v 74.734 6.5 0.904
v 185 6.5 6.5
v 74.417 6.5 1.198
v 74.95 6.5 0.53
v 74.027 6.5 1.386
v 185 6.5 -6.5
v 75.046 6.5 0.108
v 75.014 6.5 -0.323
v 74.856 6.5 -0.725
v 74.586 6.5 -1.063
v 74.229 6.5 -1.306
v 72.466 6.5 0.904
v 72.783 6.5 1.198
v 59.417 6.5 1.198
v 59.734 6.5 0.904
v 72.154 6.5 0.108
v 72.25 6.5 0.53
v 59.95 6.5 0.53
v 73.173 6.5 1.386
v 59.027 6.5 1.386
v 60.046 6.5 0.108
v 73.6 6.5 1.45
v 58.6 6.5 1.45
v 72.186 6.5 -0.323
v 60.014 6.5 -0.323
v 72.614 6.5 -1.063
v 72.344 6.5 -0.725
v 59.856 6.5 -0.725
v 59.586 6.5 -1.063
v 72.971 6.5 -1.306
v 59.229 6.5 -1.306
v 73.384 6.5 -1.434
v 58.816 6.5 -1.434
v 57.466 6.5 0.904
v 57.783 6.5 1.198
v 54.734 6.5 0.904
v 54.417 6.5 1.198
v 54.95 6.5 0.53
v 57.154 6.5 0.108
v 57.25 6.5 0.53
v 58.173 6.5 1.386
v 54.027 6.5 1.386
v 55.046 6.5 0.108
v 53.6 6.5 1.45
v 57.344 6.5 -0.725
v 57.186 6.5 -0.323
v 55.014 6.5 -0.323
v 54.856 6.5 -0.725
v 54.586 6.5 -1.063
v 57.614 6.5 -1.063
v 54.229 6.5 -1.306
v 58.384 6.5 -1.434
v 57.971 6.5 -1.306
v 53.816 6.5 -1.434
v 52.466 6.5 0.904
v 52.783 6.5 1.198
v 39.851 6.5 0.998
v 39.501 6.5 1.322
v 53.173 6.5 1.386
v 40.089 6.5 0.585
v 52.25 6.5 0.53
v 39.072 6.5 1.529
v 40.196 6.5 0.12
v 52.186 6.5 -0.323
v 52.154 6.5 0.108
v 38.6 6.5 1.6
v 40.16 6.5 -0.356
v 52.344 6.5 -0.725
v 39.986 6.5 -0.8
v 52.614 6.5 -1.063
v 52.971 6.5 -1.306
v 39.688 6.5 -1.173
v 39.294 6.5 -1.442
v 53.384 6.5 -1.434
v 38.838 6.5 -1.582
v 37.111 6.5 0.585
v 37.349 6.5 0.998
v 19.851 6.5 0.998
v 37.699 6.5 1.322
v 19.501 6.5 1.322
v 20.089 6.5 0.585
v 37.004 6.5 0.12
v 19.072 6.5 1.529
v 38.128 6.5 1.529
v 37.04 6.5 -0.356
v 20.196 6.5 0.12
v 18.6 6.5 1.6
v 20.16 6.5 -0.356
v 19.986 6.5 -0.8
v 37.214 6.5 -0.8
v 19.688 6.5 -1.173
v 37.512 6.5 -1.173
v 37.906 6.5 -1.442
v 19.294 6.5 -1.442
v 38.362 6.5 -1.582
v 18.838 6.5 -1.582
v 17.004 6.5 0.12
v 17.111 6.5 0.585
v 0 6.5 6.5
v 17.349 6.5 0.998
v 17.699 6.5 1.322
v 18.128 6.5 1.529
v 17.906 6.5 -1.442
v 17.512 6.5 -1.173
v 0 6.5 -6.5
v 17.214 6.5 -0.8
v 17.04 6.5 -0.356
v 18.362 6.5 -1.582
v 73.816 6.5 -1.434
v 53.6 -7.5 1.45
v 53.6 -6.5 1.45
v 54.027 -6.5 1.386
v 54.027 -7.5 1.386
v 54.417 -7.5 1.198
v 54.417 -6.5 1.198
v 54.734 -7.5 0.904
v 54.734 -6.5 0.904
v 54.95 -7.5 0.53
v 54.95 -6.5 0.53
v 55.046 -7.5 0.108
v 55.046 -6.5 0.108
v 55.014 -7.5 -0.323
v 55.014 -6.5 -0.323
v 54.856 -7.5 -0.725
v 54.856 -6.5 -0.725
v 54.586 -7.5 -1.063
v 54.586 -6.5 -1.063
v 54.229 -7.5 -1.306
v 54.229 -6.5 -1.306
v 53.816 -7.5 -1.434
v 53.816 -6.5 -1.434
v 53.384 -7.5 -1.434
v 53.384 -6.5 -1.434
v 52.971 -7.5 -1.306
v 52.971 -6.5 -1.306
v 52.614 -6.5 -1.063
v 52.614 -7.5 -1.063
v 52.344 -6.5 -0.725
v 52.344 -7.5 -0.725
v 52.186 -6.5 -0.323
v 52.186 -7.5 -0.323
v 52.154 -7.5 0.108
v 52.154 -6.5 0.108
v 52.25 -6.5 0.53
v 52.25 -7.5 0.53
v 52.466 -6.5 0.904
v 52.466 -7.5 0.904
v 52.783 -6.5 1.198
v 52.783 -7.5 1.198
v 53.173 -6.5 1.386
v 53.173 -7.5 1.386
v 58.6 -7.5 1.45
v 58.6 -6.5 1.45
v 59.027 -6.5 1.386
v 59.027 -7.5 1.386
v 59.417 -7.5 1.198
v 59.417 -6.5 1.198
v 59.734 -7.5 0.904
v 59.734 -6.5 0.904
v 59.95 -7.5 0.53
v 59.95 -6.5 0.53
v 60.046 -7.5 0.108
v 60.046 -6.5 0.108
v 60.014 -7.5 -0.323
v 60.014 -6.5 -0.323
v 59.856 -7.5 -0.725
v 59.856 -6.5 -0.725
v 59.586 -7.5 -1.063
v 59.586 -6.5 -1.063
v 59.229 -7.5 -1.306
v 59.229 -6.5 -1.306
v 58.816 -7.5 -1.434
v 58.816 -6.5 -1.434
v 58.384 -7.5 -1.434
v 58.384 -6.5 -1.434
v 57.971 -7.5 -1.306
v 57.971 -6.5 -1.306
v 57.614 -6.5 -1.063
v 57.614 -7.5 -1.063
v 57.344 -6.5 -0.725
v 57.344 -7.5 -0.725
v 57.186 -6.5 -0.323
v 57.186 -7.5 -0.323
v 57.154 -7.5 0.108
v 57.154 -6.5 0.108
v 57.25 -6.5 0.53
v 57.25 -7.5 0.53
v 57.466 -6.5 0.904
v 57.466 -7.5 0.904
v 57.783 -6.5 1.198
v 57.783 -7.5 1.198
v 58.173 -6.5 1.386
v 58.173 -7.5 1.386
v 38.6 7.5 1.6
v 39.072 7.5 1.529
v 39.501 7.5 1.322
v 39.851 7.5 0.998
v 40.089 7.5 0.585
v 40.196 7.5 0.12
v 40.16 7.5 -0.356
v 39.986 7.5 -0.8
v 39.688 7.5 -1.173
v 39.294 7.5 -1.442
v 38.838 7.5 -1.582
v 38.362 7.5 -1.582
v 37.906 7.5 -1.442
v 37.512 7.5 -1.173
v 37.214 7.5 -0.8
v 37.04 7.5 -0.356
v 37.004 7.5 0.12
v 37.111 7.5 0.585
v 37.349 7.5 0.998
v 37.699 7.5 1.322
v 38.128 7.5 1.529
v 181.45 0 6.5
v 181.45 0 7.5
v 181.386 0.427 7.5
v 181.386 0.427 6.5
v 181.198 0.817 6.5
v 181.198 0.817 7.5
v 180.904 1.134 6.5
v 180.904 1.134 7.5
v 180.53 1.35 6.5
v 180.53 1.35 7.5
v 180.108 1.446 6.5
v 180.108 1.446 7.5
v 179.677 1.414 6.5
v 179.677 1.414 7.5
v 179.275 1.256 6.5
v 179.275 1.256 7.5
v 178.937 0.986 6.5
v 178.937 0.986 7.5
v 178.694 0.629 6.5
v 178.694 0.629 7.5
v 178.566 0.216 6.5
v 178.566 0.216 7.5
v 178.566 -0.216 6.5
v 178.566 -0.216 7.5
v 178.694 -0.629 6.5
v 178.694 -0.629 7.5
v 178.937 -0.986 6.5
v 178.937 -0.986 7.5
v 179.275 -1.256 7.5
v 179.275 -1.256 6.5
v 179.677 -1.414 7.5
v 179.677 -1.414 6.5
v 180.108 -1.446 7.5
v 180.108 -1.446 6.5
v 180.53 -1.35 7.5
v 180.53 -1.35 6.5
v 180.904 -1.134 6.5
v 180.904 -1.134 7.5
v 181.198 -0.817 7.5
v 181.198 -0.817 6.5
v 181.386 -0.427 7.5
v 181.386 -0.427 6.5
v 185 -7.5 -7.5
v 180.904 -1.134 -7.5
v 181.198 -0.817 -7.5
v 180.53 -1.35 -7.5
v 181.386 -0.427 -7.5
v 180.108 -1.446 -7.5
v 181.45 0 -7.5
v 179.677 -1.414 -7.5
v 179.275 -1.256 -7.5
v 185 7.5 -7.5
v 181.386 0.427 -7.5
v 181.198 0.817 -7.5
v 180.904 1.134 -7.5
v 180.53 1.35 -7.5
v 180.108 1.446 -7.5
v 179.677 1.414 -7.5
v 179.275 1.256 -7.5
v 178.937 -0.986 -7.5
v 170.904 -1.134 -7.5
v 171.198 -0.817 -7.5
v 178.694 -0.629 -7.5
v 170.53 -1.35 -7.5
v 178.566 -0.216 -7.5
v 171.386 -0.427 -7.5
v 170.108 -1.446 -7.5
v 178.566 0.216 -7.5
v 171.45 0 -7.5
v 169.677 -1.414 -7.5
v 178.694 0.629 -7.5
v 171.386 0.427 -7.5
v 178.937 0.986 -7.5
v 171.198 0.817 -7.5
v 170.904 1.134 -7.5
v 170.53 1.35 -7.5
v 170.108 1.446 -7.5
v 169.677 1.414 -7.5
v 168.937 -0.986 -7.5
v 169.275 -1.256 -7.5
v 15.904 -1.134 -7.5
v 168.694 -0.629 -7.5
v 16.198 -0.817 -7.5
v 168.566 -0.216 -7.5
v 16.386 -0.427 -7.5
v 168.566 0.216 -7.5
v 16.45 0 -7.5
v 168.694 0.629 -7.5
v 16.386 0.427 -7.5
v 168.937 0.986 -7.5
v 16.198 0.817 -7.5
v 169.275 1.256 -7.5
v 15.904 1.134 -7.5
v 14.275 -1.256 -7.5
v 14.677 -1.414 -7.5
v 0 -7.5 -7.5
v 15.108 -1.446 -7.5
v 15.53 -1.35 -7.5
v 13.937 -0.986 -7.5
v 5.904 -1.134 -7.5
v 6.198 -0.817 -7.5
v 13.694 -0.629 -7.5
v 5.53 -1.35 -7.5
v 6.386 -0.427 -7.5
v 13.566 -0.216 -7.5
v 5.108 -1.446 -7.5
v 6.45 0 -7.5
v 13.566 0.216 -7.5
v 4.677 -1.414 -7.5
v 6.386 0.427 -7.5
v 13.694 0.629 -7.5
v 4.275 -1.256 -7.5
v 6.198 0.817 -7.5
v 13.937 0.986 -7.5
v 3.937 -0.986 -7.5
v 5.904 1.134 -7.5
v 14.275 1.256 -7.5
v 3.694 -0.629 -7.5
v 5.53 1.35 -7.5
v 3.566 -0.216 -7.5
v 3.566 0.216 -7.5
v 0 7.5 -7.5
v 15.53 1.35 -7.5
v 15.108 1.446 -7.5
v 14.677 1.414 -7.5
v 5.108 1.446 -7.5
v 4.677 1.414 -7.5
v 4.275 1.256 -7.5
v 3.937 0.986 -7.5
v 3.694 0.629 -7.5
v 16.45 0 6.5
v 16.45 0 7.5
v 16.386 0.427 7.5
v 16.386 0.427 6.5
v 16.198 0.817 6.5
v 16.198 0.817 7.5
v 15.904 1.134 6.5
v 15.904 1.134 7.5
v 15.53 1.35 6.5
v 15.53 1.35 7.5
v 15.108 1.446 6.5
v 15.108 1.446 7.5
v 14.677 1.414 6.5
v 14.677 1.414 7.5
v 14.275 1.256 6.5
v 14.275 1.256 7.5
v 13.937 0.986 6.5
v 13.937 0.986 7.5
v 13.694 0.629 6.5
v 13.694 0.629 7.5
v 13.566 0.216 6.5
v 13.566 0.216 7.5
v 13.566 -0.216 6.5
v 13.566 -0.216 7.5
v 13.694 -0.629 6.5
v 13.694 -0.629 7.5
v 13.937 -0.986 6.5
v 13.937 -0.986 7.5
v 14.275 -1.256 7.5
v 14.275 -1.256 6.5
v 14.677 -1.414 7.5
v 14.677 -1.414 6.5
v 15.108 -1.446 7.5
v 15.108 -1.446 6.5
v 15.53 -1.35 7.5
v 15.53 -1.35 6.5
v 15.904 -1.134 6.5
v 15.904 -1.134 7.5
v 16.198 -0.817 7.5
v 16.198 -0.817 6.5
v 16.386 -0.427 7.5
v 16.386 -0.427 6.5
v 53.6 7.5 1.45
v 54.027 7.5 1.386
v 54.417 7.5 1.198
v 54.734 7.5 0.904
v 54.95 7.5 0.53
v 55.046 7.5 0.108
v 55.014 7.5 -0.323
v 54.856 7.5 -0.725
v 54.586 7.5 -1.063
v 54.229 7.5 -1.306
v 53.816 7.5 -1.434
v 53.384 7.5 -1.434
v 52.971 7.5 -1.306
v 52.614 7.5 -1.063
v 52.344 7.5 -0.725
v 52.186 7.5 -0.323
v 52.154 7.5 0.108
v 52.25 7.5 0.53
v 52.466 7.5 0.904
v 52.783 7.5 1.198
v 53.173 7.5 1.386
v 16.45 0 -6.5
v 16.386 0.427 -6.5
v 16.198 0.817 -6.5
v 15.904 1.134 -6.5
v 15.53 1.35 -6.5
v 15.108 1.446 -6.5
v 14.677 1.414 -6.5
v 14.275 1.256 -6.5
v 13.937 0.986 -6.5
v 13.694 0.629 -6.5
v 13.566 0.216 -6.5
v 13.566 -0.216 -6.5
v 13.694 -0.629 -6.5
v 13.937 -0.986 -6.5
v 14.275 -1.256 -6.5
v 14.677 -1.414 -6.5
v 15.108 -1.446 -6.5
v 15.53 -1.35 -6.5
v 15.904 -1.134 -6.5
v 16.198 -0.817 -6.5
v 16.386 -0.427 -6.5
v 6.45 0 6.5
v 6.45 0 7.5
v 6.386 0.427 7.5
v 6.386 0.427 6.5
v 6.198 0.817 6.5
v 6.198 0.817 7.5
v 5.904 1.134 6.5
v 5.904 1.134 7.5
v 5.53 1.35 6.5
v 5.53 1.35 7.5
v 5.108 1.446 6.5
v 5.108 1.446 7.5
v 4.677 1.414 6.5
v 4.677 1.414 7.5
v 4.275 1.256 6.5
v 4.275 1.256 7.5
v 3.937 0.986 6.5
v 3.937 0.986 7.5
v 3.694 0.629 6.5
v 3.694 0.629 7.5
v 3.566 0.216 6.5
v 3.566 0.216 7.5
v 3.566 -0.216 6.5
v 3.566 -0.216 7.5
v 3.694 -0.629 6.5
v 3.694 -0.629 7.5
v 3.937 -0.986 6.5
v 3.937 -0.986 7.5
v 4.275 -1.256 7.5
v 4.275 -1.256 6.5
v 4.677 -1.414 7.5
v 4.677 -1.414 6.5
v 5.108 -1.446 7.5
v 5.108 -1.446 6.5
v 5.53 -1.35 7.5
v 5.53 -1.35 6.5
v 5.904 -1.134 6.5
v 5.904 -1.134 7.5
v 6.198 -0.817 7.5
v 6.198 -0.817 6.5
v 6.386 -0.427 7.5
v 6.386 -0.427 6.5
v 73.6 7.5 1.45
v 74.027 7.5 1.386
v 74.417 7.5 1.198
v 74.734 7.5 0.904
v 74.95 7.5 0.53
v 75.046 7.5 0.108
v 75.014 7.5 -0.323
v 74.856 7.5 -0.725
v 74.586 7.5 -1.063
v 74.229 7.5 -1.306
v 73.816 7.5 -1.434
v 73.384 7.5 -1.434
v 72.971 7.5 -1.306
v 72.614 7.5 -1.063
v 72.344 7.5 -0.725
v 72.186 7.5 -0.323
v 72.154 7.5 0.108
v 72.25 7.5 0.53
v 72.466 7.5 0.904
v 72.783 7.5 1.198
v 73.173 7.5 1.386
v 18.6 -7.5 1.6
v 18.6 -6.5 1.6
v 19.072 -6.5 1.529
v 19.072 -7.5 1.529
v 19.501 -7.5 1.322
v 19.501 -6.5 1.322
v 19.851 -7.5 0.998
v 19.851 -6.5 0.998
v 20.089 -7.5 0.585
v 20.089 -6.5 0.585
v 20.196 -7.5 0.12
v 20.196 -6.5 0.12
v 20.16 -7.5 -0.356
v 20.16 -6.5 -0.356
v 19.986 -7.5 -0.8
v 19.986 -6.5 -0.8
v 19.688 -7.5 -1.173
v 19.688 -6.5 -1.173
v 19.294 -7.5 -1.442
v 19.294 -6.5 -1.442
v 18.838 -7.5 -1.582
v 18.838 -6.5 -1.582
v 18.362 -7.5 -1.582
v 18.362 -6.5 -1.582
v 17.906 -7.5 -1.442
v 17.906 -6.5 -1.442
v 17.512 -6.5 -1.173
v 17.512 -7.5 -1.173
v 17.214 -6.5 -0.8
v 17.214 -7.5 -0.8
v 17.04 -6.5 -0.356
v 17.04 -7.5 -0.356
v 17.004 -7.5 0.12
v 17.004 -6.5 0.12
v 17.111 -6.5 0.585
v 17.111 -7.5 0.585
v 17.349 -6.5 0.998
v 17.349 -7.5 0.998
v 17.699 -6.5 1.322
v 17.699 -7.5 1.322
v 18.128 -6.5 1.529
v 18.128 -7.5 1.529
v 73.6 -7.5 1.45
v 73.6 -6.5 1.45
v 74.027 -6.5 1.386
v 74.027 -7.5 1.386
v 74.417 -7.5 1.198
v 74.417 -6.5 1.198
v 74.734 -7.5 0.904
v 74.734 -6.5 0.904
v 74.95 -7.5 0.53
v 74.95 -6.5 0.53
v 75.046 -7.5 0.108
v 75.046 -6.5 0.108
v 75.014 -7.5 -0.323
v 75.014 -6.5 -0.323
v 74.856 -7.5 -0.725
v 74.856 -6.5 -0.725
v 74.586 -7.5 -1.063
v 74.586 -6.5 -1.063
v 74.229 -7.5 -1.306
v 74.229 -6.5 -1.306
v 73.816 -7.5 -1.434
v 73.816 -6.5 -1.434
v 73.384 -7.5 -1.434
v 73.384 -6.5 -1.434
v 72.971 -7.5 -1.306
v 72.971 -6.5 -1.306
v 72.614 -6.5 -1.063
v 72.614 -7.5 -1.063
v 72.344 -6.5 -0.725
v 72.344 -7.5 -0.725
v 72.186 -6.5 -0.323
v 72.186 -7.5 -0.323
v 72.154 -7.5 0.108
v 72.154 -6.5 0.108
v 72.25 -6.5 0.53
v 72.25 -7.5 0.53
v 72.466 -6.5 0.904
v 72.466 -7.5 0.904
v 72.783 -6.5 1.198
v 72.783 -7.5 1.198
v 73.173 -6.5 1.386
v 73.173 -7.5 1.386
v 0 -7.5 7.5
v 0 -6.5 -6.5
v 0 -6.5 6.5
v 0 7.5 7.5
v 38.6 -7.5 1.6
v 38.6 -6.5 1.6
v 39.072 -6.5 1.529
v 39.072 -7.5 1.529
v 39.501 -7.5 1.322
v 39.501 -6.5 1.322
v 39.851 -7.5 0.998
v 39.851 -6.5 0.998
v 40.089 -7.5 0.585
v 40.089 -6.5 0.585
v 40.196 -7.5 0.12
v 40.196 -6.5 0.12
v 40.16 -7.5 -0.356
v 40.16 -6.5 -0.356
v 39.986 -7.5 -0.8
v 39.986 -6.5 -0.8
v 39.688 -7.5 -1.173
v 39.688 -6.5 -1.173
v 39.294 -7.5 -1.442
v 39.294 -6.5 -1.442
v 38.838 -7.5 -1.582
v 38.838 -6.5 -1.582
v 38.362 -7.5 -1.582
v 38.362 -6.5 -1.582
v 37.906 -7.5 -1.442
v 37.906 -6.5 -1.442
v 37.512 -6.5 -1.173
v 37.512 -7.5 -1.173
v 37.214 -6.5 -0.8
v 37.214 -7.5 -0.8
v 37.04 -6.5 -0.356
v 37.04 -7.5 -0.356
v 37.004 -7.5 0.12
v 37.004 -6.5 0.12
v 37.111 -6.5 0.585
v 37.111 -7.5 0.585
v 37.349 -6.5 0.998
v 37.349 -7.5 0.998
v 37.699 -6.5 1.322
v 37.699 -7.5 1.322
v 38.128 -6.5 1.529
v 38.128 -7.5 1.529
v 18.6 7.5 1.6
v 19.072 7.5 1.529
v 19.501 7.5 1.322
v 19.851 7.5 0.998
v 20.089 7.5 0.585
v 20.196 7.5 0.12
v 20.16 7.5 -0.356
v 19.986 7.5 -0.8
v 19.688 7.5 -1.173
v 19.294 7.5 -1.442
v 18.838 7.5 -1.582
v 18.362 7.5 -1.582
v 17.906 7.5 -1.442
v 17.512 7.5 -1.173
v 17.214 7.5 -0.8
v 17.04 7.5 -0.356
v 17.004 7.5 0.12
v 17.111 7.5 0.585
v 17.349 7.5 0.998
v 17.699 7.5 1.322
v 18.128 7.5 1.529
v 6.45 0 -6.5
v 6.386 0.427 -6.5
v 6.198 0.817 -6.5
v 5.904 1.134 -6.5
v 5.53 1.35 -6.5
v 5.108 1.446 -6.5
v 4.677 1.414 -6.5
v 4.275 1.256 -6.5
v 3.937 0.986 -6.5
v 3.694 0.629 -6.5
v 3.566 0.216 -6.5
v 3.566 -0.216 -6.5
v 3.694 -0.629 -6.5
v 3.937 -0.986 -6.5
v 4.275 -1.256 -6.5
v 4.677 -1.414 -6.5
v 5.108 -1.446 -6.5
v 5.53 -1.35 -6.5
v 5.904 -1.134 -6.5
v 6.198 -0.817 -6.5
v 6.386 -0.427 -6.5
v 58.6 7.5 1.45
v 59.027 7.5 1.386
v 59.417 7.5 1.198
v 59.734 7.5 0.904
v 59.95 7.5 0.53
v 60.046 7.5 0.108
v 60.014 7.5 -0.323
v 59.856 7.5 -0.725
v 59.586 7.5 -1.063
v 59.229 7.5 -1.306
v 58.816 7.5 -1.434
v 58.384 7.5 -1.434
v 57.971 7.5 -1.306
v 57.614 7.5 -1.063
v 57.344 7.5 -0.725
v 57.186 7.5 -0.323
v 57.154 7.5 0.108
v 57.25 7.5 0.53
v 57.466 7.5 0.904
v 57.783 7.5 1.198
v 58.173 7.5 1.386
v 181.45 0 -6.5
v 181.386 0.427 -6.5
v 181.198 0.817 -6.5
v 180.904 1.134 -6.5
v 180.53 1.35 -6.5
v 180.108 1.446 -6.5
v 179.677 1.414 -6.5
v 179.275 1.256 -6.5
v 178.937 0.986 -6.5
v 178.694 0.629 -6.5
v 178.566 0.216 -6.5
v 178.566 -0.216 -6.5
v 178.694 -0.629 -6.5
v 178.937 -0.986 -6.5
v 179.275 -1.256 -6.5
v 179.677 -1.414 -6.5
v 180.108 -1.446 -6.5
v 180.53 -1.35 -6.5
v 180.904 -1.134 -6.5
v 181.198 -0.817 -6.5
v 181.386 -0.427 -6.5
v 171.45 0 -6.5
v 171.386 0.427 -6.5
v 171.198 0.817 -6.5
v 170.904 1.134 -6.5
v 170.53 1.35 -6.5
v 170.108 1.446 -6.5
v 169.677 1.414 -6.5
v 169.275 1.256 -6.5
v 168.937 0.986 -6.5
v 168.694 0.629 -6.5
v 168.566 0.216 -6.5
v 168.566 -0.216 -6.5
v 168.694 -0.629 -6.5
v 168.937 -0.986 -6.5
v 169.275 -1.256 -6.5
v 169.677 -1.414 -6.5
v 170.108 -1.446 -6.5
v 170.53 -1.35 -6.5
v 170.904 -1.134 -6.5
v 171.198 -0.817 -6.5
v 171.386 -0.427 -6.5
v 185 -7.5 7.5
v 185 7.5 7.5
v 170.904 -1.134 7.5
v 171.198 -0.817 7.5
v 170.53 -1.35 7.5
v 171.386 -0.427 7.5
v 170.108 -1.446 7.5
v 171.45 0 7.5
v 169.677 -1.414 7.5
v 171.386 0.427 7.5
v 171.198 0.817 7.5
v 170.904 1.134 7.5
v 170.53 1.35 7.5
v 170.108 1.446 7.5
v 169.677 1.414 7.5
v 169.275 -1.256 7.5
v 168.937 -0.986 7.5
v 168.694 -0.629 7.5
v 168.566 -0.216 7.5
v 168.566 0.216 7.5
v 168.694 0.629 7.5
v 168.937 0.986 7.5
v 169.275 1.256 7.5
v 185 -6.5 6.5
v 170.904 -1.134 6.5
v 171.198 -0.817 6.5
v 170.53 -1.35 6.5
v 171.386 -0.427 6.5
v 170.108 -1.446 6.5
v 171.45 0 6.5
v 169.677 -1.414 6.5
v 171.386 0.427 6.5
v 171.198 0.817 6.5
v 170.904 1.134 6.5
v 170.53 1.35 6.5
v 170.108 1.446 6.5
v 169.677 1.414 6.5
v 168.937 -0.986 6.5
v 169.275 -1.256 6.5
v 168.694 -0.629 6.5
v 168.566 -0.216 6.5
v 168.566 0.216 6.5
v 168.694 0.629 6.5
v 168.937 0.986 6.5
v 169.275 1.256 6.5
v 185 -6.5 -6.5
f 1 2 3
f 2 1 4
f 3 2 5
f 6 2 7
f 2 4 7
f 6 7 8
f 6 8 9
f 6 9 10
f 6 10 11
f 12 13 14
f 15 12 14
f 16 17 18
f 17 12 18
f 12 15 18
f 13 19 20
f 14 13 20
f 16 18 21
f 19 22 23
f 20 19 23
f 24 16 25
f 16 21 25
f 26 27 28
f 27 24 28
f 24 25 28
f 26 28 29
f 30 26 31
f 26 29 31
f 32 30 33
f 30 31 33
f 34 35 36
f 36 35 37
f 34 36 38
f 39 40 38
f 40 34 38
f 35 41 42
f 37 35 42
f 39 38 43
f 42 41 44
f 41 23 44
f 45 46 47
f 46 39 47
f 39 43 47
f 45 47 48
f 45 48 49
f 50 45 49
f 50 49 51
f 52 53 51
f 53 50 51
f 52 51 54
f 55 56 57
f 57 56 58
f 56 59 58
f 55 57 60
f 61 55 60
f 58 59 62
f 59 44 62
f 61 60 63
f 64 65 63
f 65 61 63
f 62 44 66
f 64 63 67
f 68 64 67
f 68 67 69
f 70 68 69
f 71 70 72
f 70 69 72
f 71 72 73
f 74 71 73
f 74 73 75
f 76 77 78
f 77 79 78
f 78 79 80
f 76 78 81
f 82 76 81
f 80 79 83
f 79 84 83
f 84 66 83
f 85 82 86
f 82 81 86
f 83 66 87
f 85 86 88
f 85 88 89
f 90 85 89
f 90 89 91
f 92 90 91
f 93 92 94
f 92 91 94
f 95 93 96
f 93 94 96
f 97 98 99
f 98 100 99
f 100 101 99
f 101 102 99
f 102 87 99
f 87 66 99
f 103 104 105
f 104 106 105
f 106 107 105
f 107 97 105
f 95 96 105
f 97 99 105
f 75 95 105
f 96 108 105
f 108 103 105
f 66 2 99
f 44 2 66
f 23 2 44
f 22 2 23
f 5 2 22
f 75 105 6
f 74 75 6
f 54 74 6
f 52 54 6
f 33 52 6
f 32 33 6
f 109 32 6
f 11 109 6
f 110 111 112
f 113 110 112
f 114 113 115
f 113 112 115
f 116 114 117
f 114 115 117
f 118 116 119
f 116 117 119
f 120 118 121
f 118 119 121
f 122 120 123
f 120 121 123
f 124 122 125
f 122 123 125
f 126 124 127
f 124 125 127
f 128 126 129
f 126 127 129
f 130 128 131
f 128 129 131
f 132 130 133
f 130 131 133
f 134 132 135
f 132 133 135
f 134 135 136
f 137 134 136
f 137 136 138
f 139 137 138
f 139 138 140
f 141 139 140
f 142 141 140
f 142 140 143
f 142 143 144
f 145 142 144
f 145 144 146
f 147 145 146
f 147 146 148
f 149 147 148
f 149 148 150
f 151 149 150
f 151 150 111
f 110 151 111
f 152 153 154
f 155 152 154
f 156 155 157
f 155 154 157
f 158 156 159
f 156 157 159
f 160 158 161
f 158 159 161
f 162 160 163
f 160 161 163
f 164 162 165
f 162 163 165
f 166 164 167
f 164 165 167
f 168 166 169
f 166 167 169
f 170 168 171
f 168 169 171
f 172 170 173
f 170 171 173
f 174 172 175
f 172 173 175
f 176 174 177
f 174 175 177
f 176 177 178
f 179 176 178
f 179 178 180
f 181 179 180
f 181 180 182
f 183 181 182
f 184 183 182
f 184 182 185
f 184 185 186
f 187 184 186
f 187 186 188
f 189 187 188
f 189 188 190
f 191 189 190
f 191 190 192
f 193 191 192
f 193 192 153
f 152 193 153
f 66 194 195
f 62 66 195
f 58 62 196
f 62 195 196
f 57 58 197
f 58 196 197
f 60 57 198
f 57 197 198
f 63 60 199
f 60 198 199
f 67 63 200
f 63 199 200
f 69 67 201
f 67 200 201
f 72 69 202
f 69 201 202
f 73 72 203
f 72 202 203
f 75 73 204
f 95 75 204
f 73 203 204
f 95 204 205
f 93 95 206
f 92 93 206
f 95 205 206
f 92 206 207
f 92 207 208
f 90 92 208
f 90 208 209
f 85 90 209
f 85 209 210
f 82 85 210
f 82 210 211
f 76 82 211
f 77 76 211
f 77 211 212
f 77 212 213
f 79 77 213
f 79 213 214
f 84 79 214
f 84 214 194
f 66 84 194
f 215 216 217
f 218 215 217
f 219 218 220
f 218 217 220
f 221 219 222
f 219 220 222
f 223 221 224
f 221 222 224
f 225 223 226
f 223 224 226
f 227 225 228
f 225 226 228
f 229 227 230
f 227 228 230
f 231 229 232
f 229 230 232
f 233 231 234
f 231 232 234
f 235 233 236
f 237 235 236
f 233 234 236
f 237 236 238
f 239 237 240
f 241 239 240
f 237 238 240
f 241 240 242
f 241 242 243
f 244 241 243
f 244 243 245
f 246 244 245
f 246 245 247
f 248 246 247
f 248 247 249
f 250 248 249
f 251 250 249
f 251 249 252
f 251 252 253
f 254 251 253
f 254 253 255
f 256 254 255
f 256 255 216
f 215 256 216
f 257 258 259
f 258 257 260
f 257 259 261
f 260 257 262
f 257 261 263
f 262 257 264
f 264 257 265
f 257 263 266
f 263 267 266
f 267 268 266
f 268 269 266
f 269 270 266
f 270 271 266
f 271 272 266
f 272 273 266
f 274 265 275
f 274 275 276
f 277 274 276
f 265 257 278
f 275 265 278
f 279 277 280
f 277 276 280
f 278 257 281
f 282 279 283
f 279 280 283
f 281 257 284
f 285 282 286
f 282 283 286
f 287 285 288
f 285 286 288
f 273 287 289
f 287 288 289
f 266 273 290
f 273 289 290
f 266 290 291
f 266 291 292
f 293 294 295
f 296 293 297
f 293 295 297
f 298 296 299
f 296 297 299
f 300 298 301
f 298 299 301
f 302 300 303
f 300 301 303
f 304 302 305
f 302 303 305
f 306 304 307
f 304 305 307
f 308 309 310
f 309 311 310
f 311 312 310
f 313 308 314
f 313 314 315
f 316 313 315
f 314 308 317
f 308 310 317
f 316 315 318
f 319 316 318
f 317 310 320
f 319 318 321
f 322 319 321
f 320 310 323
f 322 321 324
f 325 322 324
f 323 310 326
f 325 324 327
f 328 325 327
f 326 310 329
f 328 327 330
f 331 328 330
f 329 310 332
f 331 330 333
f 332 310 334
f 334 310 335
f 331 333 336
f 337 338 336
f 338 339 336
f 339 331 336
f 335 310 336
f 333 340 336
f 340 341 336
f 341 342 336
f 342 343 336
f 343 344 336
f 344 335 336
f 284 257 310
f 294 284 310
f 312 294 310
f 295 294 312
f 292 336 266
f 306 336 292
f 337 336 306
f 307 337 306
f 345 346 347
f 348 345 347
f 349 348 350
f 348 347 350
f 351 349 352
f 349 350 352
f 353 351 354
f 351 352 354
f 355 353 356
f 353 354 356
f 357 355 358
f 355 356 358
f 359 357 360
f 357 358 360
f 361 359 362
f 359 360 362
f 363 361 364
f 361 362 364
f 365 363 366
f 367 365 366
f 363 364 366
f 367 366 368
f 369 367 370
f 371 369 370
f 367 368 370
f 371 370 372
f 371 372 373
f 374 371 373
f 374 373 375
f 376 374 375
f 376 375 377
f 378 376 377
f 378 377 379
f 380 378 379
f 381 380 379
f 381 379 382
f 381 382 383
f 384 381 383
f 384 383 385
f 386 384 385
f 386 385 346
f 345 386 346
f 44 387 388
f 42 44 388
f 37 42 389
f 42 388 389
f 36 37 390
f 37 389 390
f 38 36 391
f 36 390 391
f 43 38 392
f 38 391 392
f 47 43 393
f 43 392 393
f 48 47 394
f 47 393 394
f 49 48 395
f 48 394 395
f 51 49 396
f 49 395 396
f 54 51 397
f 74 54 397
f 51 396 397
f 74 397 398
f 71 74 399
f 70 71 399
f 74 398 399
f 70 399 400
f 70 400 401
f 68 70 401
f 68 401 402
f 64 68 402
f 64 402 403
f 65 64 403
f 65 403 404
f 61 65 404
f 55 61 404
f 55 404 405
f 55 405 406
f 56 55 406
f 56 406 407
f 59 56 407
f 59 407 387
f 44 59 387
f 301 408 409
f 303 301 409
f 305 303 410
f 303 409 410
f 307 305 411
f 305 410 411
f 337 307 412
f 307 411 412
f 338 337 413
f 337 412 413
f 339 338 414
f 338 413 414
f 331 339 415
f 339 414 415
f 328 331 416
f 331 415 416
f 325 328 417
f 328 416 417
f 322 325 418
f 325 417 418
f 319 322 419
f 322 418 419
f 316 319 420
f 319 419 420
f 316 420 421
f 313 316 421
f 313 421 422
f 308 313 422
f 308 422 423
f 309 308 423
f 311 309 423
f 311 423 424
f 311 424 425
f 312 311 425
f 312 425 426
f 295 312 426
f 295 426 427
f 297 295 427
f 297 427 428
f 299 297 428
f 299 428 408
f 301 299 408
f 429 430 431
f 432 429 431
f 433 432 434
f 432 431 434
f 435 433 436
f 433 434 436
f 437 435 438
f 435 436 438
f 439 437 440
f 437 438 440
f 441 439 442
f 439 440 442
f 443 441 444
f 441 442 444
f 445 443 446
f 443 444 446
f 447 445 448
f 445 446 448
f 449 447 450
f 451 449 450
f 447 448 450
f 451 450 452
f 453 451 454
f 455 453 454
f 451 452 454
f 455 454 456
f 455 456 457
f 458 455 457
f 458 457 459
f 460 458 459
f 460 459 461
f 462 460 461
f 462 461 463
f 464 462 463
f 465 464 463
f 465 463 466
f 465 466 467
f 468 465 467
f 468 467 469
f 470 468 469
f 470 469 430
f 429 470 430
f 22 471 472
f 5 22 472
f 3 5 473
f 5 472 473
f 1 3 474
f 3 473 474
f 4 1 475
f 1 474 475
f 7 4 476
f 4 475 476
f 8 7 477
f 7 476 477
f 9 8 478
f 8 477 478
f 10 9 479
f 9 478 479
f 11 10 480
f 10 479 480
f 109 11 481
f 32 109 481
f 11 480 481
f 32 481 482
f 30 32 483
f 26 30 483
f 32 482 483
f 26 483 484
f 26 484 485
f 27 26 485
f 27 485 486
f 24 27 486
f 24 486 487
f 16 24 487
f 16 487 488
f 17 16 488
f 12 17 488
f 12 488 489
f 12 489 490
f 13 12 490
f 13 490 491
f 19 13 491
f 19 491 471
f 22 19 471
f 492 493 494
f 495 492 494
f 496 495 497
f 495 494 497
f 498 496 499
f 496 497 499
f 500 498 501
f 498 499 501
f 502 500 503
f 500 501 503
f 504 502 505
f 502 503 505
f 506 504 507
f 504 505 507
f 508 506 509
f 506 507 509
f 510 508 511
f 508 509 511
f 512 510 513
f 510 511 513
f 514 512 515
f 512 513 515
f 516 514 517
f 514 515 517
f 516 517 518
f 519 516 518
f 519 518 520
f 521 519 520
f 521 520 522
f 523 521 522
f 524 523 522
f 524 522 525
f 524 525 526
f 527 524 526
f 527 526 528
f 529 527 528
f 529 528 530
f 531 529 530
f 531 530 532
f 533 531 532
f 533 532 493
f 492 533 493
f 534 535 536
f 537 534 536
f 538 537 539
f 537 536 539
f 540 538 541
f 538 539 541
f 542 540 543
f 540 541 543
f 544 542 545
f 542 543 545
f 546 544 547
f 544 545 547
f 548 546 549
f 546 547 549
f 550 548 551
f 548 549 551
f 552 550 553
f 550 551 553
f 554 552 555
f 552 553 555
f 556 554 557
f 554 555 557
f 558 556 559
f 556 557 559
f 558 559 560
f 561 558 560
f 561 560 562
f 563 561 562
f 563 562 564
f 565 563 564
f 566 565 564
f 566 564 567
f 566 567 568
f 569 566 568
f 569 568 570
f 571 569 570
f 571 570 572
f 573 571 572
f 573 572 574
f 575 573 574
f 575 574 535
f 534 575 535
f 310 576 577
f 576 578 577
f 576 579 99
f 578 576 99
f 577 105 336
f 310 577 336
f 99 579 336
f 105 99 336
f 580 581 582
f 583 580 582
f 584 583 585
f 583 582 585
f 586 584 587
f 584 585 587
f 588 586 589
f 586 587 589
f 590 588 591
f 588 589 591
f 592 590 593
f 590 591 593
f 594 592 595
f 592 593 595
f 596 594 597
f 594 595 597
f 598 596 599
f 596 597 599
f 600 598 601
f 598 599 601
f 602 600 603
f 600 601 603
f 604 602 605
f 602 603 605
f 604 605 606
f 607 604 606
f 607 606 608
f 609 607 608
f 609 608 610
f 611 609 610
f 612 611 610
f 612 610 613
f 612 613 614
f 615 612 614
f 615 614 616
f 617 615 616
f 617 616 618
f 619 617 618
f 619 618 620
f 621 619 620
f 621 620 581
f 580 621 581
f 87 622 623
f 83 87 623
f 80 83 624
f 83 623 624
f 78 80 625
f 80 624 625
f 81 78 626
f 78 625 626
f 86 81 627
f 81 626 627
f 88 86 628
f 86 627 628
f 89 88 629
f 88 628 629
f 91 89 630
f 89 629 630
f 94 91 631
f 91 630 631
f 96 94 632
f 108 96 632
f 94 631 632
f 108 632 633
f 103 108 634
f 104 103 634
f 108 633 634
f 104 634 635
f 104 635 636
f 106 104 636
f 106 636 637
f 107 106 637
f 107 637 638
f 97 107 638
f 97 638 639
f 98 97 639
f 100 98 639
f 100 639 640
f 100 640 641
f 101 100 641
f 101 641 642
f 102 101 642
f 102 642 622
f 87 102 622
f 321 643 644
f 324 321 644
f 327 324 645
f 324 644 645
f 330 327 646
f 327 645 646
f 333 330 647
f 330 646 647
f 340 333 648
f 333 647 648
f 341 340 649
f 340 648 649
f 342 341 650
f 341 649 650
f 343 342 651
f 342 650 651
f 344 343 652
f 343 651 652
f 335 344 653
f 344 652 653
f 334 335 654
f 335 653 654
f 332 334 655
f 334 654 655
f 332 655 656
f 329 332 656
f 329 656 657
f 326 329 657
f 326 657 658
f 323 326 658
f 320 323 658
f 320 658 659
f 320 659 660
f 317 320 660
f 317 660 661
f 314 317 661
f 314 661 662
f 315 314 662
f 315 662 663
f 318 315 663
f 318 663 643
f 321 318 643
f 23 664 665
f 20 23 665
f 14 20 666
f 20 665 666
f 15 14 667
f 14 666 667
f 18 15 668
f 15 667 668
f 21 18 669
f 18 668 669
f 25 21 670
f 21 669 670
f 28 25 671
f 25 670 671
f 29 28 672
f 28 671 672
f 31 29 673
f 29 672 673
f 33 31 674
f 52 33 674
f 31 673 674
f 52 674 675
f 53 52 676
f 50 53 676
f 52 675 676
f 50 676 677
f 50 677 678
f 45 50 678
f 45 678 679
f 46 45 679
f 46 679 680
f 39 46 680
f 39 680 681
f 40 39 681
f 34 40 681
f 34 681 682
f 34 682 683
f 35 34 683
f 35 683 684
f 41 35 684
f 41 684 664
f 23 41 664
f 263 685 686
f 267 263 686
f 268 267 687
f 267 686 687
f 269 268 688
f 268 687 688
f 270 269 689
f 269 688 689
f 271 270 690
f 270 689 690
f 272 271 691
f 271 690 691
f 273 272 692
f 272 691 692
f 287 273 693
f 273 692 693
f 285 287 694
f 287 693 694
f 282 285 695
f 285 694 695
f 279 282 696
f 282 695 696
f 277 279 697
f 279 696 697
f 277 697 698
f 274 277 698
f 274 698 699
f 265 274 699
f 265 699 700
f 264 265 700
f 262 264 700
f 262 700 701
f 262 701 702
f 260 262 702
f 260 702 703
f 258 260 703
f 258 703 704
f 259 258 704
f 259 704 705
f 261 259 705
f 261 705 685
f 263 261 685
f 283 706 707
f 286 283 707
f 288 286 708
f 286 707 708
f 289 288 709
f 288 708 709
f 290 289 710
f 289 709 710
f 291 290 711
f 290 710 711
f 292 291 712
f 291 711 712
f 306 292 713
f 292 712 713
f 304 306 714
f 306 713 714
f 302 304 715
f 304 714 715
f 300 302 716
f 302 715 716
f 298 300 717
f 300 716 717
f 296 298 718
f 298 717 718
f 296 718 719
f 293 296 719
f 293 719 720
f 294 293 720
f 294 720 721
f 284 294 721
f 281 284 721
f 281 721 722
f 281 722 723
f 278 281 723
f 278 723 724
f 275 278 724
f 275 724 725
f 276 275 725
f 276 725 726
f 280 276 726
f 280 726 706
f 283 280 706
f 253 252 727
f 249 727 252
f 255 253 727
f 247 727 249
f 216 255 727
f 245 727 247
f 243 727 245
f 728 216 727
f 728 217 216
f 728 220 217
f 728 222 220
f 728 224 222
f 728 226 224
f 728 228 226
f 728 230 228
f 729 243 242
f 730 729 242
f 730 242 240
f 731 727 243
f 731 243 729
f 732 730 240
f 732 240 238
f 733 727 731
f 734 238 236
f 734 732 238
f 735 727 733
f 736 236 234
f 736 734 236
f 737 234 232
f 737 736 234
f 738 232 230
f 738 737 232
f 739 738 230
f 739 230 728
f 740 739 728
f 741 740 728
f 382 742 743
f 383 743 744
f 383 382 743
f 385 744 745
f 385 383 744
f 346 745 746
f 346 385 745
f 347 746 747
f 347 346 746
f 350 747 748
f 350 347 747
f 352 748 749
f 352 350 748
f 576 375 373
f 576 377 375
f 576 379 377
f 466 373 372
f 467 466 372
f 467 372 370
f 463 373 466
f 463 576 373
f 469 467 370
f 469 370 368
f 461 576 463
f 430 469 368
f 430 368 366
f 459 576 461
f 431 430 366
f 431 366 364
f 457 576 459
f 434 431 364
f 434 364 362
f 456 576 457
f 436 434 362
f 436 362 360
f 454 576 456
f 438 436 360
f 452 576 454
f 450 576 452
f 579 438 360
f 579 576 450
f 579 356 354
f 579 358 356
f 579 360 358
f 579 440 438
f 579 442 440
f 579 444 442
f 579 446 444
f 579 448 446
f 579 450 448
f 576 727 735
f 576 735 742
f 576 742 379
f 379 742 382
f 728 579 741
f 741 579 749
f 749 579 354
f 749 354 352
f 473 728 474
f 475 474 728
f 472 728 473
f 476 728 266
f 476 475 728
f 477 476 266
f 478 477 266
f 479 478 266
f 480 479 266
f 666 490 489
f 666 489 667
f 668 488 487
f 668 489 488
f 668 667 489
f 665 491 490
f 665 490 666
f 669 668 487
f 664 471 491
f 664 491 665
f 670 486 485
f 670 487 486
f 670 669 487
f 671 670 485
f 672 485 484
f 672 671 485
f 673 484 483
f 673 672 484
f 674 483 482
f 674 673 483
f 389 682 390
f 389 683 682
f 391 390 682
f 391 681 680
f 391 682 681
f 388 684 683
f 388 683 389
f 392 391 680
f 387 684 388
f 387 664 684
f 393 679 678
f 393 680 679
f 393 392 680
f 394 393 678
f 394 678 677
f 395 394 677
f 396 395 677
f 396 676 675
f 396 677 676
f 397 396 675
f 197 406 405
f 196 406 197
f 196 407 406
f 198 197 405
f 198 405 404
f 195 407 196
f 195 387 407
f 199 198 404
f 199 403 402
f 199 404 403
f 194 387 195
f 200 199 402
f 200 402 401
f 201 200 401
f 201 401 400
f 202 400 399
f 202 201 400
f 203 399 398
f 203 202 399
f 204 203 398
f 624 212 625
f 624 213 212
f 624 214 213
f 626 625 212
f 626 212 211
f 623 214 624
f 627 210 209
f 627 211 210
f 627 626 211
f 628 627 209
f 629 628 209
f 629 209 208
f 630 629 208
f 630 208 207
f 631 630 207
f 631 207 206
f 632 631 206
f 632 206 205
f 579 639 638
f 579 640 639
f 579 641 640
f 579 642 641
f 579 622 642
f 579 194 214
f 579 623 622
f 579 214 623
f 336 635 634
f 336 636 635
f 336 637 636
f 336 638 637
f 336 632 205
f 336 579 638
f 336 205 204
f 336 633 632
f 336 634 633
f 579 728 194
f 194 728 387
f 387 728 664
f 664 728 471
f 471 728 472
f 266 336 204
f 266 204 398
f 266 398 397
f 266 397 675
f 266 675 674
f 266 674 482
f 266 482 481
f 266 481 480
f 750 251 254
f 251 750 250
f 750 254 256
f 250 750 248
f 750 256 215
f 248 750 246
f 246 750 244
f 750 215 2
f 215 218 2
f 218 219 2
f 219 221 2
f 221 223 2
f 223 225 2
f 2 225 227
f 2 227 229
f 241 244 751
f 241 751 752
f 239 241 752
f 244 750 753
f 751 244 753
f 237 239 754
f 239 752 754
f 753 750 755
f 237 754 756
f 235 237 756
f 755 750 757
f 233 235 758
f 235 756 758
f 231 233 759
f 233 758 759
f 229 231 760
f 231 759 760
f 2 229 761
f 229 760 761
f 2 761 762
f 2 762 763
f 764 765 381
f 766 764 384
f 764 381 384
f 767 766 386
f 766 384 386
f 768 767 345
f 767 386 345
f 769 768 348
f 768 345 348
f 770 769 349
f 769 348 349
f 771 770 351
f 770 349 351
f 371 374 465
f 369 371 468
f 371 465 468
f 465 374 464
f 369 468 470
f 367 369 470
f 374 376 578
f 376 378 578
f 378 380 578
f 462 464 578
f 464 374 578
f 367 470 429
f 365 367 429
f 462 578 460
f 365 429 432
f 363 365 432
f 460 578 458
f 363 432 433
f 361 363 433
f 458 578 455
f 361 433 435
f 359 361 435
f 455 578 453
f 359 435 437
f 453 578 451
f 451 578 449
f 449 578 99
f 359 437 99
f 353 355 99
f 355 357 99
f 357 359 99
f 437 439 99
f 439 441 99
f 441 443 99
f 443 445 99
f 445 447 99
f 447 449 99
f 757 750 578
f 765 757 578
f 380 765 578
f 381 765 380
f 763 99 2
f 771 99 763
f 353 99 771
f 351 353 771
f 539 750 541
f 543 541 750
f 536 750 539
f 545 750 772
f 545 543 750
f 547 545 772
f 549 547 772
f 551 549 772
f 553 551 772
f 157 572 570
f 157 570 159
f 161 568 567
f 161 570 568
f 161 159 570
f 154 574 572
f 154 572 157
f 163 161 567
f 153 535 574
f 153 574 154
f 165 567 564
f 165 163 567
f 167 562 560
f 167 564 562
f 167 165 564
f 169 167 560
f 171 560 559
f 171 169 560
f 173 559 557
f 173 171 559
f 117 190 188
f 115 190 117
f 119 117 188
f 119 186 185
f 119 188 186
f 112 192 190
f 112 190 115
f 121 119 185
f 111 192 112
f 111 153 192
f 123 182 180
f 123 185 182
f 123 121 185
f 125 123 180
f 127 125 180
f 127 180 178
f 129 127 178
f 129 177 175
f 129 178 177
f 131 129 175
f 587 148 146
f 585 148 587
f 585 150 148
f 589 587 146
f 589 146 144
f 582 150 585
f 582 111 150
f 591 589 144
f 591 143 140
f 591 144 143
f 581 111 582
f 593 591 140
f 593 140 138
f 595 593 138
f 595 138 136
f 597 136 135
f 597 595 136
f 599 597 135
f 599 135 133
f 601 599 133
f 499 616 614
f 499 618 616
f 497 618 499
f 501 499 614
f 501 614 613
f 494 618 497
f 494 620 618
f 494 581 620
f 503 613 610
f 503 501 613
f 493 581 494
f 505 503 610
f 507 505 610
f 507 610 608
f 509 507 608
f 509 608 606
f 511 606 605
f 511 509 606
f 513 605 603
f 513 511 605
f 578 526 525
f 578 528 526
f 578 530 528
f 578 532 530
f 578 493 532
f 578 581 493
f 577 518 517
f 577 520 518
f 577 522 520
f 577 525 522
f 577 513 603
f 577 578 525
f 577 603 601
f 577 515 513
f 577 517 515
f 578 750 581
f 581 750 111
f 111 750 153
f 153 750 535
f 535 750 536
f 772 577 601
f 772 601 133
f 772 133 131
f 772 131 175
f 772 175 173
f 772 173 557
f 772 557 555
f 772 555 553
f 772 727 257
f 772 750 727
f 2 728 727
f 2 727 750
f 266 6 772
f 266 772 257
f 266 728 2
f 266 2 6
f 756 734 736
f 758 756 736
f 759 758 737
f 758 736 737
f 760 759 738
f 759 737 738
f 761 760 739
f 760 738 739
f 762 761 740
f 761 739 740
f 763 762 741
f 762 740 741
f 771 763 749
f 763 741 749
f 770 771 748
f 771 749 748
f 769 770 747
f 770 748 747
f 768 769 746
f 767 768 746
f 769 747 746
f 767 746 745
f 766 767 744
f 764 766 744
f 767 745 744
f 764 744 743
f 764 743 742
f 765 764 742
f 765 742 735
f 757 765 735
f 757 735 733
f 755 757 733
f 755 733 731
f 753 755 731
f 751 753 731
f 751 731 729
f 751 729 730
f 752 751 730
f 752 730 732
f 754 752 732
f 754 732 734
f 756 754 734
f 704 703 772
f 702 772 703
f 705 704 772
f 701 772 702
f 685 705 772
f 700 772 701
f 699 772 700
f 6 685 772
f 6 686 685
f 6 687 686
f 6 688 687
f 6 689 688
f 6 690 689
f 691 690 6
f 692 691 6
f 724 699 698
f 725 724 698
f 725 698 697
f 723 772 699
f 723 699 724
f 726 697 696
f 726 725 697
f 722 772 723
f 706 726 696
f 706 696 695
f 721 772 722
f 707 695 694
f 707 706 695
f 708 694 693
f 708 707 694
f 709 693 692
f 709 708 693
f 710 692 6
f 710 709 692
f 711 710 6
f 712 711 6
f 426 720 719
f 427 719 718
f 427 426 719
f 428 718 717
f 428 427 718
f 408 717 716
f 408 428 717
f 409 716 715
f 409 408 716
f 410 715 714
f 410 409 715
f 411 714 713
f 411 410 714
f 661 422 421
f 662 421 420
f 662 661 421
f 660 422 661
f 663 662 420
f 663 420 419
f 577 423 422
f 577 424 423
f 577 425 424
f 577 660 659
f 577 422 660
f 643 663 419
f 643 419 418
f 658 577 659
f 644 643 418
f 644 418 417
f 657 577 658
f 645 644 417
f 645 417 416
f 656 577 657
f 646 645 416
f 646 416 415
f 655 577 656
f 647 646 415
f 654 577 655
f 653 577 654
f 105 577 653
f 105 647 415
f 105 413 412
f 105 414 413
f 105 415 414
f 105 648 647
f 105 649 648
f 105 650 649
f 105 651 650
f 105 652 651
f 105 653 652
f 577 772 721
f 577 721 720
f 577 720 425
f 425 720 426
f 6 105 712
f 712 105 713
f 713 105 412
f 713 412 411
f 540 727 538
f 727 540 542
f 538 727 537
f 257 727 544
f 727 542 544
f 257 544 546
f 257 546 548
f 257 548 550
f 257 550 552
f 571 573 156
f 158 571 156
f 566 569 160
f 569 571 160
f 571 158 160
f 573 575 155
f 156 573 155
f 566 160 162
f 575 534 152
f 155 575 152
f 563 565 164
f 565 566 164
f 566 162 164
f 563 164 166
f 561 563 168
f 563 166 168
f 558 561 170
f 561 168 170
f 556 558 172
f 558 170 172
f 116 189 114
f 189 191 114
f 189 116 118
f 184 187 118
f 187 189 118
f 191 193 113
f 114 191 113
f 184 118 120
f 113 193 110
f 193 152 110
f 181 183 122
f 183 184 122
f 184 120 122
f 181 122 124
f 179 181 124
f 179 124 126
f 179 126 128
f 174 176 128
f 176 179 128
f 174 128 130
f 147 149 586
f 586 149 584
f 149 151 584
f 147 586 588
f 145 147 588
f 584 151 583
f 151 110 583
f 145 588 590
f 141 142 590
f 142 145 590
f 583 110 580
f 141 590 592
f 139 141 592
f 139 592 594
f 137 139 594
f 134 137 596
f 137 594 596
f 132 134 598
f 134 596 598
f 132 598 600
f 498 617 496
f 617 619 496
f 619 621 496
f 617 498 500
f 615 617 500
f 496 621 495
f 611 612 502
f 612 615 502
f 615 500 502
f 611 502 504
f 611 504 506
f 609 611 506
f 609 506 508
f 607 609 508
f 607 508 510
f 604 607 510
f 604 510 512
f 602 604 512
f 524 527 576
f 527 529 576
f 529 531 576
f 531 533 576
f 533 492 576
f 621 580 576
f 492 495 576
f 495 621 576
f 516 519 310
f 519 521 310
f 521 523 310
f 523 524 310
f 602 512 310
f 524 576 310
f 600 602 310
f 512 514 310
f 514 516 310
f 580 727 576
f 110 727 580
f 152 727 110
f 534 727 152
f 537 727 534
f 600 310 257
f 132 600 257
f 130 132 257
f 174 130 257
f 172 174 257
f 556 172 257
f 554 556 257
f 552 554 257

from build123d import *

# Parameters (mm, degrees)
SKETCH_1_W          = 15
SKETCH_1_H          = 15
SKETCH_1_W_2        = 13
SKETCH_1_H_2        = 13
EXTRUDE_1_DEPTH     = 185
SKETCH_2_R          = 1.45
CUT_EXTRUDE_1_DEPTH = 186.758579883
SKETCH_3_R          = 1.6
SKETCH_3_R_2        = 1.45
CUT_EXTRUDE_2_DEPTH = 186.758579883


with BuildPart() as part:
    # 草图1 → 凸台-拉伸1 (new body)
    with BuildSketch(Plane(origin=(0, 0, 0), x_dir=(0, 0, -1), z_dir=(1, 0, 0))):
        Rectangle(SKETCH_1_W, SKETCH_1_H)
        Rectangle(SKETCH_1_W_2, SKETCH_1_H_2, mode=Mode.SUBTRACT)
    extrude(amount=EXTRUDE_1_DEPTH)

    # 草图2 → 切除-拉伸1 (cut, through all)
    with BuildSketch(Plane.XY.offset(7.5)):
        with Locations((180, 0)):
            Circle(SKETCH_2_R)
        with Locations((170, 0)):
            Circle(SKETCH_2_R)
        with Locations((5, 0)):
            Circle(SKETCH_2_R)
        with Locations((15, 0)):
            Circle(SKETCH_2_R)
    extrude(amount=-CUT_EXTRUDE_1_DEPTH, mode=Mode.SUBTRACT)

    # 草图3 → 切除-拉伸2 (cut, through all)
    with BuildSketch(Plane(origin=(0, 7.5, 0), x_dir=(1, 0, 0), z_dir=(0, 1, 0))):
        with Locations(Location((38.6, 0, 0), (0, 0, 270))):
            Circle(SKETCH_3_R)
        with Locations(Location((18.6, 0, 0), (0, 0, 270))):
            Circle(SKETCH_3_R)
        with Locations(Location((53.6, 0, 0), (0, 0, 270))):
            Circle(SKETCH_3_R_2)
        with Locations(Location((58.6, 0, 0), (0, 0, 270))):
            Circle(SKETCH_3_R_2)
        with Locations(Location((73.6, 0, 0), (0, 0, 270))):
            Circle(SKETCH_3_R_2)
    extrude(amount=-CUT_EXTRUDE_2_DEPTH, mode=Mode.SUBTRACT)


solid = part.part
